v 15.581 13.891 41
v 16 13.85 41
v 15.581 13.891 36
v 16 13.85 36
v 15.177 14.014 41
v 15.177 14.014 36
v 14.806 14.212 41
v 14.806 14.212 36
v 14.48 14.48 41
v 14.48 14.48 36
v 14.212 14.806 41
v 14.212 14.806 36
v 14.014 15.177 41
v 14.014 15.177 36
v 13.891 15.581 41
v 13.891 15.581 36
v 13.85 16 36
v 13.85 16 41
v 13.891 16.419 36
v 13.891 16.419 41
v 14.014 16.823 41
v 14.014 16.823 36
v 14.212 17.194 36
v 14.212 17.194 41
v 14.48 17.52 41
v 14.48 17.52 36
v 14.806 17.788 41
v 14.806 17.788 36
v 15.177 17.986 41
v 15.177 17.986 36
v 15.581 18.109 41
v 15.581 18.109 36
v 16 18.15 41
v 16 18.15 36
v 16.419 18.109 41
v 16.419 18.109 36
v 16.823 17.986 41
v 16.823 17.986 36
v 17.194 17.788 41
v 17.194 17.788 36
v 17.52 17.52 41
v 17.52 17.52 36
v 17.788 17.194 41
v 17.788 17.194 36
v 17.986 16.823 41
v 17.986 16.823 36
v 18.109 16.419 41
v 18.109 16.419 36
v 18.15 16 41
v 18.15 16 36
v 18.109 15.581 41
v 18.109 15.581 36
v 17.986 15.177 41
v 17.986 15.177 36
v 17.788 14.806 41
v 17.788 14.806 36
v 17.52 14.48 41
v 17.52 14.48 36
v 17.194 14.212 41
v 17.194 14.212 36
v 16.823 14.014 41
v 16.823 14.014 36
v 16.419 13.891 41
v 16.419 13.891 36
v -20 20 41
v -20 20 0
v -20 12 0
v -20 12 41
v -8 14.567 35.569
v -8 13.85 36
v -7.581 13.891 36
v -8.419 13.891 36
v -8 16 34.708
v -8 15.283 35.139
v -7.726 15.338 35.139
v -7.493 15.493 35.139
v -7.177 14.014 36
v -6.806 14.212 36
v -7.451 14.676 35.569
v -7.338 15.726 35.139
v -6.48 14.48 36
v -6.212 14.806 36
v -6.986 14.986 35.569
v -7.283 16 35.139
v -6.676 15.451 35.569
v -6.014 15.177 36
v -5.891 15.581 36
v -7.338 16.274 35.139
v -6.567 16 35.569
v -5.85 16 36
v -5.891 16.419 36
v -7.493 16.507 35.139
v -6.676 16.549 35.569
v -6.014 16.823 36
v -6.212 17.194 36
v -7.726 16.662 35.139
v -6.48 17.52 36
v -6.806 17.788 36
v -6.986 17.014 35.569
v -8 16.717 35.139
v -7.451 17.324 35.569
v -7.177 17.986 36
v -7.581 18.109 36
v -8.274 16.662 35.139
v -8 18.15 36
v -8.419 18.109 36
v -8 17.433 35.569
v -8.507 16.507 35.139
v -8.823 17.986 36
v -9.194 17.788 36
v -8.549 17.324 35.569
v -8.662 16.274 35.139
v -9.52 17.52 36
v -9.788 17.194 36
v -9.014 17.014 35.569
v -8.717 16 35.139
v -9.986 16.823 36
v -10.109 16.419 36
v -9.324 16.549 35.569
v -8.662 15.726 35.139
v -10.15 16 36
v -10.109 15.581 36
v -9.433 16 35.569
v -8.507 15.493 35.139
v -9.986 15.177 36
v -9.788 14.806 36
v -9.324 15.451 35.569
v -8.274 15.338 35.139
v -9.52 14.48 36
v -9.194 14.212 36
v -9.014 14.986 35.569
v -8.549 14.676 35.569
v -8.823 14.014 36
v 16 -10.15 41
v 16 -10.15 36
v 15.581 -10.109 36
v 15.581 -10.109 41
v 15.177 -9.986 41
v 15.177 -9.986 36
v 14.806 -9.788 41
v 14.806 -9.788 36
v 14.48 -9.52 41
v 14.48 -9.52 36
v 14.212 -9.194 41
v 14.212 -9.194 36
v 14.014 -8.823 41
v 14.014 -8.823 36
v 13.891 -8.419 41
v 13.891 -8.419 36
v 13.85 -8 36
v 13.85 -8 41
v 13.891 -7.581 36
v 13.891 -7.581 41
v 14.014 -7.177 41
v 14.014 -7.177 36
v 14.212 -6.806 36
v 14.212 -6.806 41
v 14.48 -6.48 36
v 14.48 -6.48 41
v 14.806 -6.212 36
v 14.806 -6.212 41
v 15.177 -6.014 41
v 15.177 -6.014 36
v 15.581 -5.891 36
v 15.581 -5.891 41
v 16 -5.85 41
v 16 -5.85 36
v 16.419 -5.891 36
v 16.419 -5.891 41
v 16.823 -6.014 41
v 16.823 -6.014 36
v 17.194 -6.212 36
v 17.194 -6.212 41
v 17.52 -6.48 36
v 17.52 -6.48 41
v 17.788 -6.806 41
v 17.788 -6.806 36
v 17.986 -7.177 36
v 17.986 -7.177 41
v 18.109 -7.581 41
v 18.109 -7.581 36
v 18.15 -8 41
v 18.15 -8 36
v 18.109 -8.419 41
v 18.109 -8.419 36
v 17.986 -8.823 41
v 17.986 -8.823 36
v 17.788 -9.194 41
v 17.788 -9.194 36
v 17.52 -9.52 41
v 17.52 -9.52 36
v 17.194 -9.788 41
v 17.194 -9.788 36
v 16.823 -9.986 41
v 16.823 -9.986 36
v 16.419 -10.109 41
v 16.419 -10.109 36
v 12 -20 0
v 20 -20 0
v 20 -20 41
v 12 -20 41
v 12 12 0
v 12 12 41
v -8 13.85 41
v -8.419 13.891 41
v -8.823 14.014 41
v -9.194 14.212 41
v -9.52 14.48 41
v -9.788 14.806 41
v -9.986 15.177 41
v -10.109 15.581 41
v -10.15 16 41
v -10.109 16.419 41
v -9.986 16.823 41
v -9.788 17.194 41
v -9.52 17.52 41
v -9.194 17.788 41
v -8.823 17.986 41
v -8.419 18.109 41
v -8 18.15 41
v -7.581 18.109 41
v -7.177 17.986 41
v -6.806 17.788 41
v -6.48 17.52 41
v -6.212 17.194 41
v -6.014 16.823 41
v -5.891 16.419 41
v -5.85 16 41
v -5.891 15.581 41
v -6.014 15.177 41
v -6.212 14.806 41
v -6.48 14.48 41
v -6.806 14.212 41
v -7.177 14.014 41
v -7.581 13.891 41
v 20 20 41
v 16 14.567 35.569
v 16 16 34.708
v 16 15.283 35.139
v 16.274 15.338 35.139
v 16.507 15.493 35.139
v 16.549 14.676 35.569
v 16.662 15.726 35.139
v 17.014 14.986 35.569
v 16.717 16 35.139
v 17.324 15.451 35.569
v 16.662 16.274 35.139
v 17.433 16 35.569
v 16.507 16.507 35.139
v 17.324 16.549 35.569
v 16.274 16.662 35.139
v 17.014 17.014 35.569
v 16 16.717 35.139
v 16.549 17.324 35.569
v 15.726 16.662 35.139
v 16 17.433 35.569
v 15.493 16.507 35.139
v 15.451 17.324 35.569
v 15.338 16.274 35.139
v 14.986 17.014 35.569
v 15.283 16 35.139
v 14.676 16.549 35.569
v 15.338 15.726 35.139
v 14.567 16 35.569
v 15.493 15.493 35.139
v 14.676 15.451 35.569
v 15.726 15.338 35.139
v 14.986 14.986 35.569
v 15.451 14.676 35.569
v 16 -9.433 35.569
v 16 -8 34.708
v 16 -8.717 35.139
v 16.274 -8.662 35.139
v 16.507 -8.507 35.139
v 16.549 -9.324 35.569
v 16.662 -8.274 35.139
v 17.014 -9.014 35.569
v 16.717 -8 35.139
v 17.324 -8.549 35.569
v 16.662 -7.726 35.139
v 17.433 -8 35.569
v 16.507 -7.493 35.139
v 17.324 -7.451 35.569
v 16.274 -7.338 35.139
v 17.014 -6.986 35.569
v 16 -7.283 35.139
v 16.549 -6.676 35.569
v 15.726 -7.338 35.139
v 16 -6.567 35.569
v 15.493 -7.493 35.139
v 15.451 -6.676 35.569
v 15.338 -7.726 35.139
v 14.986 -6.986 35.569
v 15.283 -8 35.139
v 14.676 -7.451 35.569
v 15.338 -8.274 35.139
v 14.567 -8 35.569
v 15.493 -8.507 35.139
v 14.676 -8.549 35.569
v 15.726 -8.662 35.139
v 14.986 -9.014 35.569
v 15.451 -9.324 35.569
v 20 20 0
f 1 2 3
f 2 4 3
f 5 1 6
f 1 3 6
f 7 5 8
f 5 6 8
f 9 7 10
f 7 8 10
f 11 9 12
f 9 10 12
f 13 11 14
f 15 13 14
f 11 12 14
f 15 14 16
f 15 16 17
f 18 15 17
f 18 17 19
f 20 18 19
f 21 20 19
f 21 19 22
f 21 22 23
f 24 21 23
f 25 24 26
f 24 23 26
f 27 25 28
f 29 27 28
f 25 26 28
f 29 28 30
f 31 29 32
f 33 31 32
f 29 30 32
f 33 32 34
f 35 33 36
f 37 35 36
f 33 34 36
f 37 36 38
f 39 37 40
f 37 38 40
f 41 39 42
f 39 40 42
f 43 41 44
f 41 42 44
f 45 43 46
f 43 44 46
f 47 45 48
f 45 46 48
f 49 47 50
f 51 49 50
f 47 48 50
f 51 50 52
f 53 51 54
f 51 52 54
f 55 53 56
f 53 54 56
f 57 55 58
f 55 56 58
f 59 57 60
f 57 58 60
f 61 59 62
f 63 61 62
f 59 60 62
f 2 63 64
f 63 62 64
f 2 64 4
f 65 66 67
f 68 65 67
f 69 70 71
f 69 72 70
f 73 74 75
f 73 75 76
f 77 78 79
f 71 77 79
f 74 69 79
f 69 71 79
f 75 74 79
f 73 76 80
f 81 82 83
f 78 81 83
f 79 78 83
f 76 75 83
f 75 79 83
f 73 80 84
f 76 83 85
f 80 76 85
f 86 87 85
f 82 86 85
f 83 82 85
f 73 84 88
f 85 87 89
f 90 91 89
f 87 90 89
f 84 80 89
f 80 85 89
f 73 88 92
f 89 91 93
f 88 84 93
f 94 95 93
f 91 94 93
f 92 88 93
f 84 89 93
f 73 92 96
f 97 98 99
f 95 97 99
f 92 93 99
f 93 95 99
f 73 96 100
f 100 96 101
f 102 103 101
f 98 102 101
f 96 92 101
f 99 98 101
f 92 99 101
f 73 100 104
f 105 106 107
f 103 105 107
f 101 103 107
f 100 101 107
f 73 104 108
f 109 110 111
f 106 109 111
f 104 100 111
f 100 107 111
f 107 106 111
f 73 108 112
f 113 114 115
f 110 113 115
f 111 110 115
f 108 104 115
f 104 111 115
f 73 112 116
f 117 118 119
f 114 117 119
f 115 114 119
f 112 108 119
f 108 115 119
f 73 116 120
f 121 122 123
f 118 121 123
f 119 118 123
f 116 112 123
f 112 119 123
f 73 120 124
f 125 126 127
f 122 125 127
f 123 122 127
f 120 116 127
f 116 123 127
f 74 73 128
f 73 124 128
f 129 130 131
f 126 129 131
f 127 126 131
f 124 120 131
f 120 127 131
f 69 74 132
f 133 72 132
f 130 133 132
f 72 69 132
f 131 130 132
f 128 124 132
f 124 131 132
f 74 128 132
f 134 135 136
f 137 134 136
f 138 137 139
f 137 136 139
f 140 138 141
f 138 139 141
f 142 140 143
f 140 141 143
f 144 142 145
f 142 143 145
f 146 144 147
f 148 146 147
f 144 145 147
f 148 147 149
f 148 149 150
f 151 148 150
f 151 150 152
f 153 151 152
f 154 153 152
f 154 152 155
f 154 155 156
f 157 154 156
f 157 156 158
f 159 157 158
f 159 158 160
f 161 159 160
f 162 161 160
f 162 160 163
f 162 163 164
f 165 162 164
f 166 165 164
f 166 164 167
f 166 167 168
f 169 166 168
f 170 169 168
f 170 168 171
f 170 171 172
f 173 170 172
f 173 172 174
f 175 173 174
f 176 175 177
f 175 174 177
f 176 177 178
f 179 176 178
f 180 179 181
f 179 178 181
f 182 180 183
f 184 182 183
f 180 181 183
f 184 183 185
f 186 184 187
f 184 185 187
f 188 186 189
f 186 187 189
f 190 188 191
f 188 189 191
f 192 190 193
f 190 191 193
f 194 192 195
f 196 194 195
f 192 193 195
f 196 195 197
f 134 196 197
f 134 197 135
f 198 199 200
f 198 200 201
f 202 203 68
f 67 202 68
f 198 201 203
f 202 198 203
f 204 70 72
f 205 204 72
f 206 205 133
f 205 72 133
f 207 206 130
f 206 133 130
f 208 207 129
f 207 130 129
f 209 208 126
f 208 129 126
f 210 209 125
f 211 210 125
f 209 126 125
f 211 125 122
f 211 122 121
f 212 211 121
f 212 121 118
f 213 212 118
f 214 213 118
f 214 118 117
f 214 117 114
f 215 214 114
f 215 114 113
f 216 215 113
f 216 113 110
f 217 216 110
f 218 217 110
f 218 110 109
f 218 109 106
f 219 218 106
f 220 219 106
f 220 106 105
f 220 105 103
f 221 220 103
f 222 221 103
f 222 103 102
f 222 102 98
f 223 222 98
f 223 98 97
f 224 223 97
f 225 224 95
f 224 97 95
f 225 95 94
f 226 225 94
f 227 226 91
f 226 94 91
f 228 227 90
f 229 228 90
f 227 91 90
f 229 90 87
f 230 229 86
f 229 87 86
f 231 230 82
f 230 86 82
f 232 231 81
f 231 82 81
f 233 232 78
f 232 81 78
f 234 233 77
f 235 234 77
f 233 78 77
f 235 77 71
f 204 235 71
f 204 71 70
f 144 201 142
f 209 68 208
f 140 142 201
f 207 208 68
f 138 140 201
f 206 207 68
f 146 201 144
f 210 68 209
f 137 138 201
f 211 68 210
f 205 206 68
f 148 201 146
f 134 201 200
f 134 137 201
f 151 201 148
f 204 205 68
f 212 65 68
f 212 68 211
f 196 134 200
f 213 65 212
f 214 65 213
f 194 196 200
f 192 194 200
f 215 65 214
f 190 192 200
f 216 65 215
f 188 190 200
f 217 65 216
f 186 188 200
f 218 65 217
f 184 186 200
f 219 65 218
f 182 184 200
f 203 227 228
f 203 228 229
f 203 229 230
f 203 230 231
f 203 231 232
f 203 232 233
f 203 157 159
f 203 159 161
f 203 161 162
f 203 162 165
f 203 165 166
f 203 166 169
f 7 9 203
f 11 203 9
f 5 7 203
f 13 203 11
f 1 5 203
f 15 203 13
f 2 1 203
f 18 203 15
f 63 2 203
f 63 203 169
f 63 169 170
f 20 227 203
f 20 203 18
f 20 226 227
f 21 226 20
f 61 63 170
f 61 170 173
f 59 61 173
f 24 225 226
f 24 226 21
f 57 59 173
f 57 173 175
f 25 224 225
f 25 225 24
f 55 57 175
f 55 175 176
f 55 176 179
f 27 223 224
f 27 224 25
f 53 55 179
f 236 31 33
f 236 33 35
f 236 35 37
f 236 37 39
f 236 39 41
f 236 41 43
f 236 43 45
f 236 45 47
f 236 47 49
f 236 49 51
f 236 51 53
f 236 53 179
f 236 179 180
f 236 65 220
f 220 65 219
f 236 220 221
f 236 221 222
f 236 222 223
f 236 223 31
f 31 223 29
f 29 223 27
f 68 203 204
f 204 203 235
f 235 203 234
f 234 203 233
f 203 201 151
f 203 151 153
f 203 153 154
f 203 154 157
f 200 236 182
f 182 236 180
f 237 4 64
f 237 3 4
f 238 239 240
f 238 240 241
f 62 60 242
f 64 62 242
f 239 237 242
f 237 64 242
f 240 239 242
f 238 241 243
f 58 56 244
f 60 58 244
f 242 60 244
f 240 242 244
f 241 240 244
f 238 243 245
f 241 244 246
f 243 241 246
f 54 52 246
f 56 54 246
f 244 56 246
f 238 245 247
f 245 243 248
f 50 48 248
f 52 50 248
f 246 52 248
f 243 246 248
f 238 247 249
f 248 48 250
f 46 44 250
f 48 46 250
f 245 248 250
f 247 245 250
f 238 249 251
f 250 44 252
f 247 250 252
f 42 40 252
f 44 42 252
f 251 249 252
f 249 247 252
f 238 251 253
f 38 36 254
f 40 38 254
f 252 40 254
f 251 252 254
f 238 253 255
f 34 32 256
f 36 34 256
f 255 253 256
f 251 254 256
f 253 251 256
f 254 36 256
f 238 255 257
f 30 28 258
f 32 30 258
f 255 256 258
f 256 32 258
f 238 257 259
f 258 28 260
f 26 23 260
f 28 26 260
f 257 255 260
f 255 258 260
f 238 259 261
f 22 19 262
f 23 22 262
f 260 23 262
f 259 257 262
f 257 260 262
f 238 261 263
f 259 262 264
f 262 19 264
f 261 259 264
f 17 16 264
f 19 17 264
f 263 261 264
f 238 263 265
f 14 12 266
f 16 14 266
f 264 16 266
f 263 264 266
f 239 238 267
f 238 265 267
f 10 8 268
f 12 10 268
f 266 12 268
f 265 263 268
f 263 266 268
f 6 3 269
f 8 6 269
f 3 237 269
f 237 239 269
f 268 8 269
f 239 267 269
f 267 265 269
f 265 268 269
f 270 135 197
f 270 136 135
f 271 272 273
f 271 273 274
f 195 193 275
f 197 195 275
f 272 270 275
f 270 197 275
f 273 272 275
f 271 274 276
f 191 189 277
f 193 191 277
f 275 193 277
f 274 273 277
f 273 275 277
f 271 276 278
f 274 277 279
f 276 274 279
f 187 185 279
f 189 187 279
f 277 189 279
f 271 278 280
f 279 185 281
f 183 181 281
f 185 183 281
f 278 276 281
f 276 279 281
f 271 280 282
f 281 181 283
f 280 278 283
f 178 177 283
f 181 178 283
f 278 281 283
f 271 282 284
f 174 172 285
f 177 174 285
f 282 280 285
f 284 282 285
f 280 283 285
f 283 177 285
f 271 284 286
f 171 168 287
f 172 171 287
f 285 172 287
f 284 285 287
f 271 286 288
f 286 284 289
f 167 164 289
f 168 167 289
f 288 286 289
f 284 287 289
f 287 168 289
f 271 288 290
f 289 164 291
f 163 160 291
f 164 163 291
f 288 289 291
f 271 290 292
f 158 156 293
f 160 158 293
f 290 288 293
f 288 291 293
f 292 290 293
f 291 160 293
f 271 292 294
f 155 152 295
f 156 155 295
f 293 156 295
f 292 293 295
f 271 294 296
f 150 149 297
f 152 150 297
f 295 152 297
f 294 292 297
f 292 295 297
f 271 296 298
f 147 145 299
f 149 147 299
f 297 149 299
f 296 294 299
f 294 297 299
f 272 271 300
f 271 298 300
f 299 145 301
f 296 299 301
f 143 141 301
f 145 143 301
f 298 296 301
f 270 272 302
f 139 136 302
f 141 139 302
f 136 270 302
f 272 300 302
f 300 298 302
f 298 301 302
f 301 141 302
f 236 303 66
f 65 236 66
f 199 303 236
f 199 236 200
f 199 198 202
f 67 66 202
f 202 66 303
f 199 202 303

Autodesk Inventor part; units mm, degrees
ref_plane "YZ Plane" through (0, 0, 0) normal (1, 0, 0) x (0, 1, 0)
ref_plane "XZ Plane" through (0, 0, 0) normal (0, 1, 0) x (-1, 0, 0)
ref_plane "XY Plane" through (0, 0, 0) normal (0, 0, 1) x (1, 0, 0)
sketch "Sketch1" plane through (0, 0, 0) normal (0, 0, 1) x (1, 0, 0)
  line L0 (20, -20) -> (20, 20) construction
  line L1 (20, 20) -> (-20, 20) construction
  line L2 (-20, 20) -> (-20, -20) construction
  line L3 (-20, -20) -> (20, 20) construction
  line L4 (20, -20) -> (-20, 20) construction
  line L5 (20, 20) -> (-20, 20)
  line L6 (20, 20) -> (20, -20)
  line L7 (-20, -20) -> (20, -20) construction
  line L8 (20, -20) -> (12, -20)
  line L9 (12, -20) -> (12, 12)
  line L10 (12, 12) -> (-20, 12)
  line L11 (-20, 20) -> (-20, 12)
  point P0 (0, 0)
  dimension "d0" = 40
  dimension "d1" = 40
  dimension "d3" = 8
extrude "Extrusion1" add sketch "Sketch1" along normal blind 41
sketch "Sketch2" plane through (0, 0, 41) normal (0, 0, 1) x (1, 0, 0)
  line L0 (20, 20) -> (-20, 20) construction
  line L1 (20, 20) -> (20, 16) construction
  line L2 (20, -20) -> (20, 20) construction
  line L3 (20, 16) -> (16, 16) construction
  line L4 (16, 16) -> (-8, 16) construction
  line L5 (16, 16) -> (16, -8) construction
  point P0 (0, 0)
  dimension "d6" = 4
  dimension "d7" = 4
  dimension "d8" = 24
  dimension "d9" = 24
hole "Hole1" at (-8, 16, 41) at (16, 16, 41) at (16, -8, 41) direction (0, 0, -1) diameter 4.3 depth 5 tip angle 118
properties part number "MirroHouseModel" material "Steel, Carbon"
